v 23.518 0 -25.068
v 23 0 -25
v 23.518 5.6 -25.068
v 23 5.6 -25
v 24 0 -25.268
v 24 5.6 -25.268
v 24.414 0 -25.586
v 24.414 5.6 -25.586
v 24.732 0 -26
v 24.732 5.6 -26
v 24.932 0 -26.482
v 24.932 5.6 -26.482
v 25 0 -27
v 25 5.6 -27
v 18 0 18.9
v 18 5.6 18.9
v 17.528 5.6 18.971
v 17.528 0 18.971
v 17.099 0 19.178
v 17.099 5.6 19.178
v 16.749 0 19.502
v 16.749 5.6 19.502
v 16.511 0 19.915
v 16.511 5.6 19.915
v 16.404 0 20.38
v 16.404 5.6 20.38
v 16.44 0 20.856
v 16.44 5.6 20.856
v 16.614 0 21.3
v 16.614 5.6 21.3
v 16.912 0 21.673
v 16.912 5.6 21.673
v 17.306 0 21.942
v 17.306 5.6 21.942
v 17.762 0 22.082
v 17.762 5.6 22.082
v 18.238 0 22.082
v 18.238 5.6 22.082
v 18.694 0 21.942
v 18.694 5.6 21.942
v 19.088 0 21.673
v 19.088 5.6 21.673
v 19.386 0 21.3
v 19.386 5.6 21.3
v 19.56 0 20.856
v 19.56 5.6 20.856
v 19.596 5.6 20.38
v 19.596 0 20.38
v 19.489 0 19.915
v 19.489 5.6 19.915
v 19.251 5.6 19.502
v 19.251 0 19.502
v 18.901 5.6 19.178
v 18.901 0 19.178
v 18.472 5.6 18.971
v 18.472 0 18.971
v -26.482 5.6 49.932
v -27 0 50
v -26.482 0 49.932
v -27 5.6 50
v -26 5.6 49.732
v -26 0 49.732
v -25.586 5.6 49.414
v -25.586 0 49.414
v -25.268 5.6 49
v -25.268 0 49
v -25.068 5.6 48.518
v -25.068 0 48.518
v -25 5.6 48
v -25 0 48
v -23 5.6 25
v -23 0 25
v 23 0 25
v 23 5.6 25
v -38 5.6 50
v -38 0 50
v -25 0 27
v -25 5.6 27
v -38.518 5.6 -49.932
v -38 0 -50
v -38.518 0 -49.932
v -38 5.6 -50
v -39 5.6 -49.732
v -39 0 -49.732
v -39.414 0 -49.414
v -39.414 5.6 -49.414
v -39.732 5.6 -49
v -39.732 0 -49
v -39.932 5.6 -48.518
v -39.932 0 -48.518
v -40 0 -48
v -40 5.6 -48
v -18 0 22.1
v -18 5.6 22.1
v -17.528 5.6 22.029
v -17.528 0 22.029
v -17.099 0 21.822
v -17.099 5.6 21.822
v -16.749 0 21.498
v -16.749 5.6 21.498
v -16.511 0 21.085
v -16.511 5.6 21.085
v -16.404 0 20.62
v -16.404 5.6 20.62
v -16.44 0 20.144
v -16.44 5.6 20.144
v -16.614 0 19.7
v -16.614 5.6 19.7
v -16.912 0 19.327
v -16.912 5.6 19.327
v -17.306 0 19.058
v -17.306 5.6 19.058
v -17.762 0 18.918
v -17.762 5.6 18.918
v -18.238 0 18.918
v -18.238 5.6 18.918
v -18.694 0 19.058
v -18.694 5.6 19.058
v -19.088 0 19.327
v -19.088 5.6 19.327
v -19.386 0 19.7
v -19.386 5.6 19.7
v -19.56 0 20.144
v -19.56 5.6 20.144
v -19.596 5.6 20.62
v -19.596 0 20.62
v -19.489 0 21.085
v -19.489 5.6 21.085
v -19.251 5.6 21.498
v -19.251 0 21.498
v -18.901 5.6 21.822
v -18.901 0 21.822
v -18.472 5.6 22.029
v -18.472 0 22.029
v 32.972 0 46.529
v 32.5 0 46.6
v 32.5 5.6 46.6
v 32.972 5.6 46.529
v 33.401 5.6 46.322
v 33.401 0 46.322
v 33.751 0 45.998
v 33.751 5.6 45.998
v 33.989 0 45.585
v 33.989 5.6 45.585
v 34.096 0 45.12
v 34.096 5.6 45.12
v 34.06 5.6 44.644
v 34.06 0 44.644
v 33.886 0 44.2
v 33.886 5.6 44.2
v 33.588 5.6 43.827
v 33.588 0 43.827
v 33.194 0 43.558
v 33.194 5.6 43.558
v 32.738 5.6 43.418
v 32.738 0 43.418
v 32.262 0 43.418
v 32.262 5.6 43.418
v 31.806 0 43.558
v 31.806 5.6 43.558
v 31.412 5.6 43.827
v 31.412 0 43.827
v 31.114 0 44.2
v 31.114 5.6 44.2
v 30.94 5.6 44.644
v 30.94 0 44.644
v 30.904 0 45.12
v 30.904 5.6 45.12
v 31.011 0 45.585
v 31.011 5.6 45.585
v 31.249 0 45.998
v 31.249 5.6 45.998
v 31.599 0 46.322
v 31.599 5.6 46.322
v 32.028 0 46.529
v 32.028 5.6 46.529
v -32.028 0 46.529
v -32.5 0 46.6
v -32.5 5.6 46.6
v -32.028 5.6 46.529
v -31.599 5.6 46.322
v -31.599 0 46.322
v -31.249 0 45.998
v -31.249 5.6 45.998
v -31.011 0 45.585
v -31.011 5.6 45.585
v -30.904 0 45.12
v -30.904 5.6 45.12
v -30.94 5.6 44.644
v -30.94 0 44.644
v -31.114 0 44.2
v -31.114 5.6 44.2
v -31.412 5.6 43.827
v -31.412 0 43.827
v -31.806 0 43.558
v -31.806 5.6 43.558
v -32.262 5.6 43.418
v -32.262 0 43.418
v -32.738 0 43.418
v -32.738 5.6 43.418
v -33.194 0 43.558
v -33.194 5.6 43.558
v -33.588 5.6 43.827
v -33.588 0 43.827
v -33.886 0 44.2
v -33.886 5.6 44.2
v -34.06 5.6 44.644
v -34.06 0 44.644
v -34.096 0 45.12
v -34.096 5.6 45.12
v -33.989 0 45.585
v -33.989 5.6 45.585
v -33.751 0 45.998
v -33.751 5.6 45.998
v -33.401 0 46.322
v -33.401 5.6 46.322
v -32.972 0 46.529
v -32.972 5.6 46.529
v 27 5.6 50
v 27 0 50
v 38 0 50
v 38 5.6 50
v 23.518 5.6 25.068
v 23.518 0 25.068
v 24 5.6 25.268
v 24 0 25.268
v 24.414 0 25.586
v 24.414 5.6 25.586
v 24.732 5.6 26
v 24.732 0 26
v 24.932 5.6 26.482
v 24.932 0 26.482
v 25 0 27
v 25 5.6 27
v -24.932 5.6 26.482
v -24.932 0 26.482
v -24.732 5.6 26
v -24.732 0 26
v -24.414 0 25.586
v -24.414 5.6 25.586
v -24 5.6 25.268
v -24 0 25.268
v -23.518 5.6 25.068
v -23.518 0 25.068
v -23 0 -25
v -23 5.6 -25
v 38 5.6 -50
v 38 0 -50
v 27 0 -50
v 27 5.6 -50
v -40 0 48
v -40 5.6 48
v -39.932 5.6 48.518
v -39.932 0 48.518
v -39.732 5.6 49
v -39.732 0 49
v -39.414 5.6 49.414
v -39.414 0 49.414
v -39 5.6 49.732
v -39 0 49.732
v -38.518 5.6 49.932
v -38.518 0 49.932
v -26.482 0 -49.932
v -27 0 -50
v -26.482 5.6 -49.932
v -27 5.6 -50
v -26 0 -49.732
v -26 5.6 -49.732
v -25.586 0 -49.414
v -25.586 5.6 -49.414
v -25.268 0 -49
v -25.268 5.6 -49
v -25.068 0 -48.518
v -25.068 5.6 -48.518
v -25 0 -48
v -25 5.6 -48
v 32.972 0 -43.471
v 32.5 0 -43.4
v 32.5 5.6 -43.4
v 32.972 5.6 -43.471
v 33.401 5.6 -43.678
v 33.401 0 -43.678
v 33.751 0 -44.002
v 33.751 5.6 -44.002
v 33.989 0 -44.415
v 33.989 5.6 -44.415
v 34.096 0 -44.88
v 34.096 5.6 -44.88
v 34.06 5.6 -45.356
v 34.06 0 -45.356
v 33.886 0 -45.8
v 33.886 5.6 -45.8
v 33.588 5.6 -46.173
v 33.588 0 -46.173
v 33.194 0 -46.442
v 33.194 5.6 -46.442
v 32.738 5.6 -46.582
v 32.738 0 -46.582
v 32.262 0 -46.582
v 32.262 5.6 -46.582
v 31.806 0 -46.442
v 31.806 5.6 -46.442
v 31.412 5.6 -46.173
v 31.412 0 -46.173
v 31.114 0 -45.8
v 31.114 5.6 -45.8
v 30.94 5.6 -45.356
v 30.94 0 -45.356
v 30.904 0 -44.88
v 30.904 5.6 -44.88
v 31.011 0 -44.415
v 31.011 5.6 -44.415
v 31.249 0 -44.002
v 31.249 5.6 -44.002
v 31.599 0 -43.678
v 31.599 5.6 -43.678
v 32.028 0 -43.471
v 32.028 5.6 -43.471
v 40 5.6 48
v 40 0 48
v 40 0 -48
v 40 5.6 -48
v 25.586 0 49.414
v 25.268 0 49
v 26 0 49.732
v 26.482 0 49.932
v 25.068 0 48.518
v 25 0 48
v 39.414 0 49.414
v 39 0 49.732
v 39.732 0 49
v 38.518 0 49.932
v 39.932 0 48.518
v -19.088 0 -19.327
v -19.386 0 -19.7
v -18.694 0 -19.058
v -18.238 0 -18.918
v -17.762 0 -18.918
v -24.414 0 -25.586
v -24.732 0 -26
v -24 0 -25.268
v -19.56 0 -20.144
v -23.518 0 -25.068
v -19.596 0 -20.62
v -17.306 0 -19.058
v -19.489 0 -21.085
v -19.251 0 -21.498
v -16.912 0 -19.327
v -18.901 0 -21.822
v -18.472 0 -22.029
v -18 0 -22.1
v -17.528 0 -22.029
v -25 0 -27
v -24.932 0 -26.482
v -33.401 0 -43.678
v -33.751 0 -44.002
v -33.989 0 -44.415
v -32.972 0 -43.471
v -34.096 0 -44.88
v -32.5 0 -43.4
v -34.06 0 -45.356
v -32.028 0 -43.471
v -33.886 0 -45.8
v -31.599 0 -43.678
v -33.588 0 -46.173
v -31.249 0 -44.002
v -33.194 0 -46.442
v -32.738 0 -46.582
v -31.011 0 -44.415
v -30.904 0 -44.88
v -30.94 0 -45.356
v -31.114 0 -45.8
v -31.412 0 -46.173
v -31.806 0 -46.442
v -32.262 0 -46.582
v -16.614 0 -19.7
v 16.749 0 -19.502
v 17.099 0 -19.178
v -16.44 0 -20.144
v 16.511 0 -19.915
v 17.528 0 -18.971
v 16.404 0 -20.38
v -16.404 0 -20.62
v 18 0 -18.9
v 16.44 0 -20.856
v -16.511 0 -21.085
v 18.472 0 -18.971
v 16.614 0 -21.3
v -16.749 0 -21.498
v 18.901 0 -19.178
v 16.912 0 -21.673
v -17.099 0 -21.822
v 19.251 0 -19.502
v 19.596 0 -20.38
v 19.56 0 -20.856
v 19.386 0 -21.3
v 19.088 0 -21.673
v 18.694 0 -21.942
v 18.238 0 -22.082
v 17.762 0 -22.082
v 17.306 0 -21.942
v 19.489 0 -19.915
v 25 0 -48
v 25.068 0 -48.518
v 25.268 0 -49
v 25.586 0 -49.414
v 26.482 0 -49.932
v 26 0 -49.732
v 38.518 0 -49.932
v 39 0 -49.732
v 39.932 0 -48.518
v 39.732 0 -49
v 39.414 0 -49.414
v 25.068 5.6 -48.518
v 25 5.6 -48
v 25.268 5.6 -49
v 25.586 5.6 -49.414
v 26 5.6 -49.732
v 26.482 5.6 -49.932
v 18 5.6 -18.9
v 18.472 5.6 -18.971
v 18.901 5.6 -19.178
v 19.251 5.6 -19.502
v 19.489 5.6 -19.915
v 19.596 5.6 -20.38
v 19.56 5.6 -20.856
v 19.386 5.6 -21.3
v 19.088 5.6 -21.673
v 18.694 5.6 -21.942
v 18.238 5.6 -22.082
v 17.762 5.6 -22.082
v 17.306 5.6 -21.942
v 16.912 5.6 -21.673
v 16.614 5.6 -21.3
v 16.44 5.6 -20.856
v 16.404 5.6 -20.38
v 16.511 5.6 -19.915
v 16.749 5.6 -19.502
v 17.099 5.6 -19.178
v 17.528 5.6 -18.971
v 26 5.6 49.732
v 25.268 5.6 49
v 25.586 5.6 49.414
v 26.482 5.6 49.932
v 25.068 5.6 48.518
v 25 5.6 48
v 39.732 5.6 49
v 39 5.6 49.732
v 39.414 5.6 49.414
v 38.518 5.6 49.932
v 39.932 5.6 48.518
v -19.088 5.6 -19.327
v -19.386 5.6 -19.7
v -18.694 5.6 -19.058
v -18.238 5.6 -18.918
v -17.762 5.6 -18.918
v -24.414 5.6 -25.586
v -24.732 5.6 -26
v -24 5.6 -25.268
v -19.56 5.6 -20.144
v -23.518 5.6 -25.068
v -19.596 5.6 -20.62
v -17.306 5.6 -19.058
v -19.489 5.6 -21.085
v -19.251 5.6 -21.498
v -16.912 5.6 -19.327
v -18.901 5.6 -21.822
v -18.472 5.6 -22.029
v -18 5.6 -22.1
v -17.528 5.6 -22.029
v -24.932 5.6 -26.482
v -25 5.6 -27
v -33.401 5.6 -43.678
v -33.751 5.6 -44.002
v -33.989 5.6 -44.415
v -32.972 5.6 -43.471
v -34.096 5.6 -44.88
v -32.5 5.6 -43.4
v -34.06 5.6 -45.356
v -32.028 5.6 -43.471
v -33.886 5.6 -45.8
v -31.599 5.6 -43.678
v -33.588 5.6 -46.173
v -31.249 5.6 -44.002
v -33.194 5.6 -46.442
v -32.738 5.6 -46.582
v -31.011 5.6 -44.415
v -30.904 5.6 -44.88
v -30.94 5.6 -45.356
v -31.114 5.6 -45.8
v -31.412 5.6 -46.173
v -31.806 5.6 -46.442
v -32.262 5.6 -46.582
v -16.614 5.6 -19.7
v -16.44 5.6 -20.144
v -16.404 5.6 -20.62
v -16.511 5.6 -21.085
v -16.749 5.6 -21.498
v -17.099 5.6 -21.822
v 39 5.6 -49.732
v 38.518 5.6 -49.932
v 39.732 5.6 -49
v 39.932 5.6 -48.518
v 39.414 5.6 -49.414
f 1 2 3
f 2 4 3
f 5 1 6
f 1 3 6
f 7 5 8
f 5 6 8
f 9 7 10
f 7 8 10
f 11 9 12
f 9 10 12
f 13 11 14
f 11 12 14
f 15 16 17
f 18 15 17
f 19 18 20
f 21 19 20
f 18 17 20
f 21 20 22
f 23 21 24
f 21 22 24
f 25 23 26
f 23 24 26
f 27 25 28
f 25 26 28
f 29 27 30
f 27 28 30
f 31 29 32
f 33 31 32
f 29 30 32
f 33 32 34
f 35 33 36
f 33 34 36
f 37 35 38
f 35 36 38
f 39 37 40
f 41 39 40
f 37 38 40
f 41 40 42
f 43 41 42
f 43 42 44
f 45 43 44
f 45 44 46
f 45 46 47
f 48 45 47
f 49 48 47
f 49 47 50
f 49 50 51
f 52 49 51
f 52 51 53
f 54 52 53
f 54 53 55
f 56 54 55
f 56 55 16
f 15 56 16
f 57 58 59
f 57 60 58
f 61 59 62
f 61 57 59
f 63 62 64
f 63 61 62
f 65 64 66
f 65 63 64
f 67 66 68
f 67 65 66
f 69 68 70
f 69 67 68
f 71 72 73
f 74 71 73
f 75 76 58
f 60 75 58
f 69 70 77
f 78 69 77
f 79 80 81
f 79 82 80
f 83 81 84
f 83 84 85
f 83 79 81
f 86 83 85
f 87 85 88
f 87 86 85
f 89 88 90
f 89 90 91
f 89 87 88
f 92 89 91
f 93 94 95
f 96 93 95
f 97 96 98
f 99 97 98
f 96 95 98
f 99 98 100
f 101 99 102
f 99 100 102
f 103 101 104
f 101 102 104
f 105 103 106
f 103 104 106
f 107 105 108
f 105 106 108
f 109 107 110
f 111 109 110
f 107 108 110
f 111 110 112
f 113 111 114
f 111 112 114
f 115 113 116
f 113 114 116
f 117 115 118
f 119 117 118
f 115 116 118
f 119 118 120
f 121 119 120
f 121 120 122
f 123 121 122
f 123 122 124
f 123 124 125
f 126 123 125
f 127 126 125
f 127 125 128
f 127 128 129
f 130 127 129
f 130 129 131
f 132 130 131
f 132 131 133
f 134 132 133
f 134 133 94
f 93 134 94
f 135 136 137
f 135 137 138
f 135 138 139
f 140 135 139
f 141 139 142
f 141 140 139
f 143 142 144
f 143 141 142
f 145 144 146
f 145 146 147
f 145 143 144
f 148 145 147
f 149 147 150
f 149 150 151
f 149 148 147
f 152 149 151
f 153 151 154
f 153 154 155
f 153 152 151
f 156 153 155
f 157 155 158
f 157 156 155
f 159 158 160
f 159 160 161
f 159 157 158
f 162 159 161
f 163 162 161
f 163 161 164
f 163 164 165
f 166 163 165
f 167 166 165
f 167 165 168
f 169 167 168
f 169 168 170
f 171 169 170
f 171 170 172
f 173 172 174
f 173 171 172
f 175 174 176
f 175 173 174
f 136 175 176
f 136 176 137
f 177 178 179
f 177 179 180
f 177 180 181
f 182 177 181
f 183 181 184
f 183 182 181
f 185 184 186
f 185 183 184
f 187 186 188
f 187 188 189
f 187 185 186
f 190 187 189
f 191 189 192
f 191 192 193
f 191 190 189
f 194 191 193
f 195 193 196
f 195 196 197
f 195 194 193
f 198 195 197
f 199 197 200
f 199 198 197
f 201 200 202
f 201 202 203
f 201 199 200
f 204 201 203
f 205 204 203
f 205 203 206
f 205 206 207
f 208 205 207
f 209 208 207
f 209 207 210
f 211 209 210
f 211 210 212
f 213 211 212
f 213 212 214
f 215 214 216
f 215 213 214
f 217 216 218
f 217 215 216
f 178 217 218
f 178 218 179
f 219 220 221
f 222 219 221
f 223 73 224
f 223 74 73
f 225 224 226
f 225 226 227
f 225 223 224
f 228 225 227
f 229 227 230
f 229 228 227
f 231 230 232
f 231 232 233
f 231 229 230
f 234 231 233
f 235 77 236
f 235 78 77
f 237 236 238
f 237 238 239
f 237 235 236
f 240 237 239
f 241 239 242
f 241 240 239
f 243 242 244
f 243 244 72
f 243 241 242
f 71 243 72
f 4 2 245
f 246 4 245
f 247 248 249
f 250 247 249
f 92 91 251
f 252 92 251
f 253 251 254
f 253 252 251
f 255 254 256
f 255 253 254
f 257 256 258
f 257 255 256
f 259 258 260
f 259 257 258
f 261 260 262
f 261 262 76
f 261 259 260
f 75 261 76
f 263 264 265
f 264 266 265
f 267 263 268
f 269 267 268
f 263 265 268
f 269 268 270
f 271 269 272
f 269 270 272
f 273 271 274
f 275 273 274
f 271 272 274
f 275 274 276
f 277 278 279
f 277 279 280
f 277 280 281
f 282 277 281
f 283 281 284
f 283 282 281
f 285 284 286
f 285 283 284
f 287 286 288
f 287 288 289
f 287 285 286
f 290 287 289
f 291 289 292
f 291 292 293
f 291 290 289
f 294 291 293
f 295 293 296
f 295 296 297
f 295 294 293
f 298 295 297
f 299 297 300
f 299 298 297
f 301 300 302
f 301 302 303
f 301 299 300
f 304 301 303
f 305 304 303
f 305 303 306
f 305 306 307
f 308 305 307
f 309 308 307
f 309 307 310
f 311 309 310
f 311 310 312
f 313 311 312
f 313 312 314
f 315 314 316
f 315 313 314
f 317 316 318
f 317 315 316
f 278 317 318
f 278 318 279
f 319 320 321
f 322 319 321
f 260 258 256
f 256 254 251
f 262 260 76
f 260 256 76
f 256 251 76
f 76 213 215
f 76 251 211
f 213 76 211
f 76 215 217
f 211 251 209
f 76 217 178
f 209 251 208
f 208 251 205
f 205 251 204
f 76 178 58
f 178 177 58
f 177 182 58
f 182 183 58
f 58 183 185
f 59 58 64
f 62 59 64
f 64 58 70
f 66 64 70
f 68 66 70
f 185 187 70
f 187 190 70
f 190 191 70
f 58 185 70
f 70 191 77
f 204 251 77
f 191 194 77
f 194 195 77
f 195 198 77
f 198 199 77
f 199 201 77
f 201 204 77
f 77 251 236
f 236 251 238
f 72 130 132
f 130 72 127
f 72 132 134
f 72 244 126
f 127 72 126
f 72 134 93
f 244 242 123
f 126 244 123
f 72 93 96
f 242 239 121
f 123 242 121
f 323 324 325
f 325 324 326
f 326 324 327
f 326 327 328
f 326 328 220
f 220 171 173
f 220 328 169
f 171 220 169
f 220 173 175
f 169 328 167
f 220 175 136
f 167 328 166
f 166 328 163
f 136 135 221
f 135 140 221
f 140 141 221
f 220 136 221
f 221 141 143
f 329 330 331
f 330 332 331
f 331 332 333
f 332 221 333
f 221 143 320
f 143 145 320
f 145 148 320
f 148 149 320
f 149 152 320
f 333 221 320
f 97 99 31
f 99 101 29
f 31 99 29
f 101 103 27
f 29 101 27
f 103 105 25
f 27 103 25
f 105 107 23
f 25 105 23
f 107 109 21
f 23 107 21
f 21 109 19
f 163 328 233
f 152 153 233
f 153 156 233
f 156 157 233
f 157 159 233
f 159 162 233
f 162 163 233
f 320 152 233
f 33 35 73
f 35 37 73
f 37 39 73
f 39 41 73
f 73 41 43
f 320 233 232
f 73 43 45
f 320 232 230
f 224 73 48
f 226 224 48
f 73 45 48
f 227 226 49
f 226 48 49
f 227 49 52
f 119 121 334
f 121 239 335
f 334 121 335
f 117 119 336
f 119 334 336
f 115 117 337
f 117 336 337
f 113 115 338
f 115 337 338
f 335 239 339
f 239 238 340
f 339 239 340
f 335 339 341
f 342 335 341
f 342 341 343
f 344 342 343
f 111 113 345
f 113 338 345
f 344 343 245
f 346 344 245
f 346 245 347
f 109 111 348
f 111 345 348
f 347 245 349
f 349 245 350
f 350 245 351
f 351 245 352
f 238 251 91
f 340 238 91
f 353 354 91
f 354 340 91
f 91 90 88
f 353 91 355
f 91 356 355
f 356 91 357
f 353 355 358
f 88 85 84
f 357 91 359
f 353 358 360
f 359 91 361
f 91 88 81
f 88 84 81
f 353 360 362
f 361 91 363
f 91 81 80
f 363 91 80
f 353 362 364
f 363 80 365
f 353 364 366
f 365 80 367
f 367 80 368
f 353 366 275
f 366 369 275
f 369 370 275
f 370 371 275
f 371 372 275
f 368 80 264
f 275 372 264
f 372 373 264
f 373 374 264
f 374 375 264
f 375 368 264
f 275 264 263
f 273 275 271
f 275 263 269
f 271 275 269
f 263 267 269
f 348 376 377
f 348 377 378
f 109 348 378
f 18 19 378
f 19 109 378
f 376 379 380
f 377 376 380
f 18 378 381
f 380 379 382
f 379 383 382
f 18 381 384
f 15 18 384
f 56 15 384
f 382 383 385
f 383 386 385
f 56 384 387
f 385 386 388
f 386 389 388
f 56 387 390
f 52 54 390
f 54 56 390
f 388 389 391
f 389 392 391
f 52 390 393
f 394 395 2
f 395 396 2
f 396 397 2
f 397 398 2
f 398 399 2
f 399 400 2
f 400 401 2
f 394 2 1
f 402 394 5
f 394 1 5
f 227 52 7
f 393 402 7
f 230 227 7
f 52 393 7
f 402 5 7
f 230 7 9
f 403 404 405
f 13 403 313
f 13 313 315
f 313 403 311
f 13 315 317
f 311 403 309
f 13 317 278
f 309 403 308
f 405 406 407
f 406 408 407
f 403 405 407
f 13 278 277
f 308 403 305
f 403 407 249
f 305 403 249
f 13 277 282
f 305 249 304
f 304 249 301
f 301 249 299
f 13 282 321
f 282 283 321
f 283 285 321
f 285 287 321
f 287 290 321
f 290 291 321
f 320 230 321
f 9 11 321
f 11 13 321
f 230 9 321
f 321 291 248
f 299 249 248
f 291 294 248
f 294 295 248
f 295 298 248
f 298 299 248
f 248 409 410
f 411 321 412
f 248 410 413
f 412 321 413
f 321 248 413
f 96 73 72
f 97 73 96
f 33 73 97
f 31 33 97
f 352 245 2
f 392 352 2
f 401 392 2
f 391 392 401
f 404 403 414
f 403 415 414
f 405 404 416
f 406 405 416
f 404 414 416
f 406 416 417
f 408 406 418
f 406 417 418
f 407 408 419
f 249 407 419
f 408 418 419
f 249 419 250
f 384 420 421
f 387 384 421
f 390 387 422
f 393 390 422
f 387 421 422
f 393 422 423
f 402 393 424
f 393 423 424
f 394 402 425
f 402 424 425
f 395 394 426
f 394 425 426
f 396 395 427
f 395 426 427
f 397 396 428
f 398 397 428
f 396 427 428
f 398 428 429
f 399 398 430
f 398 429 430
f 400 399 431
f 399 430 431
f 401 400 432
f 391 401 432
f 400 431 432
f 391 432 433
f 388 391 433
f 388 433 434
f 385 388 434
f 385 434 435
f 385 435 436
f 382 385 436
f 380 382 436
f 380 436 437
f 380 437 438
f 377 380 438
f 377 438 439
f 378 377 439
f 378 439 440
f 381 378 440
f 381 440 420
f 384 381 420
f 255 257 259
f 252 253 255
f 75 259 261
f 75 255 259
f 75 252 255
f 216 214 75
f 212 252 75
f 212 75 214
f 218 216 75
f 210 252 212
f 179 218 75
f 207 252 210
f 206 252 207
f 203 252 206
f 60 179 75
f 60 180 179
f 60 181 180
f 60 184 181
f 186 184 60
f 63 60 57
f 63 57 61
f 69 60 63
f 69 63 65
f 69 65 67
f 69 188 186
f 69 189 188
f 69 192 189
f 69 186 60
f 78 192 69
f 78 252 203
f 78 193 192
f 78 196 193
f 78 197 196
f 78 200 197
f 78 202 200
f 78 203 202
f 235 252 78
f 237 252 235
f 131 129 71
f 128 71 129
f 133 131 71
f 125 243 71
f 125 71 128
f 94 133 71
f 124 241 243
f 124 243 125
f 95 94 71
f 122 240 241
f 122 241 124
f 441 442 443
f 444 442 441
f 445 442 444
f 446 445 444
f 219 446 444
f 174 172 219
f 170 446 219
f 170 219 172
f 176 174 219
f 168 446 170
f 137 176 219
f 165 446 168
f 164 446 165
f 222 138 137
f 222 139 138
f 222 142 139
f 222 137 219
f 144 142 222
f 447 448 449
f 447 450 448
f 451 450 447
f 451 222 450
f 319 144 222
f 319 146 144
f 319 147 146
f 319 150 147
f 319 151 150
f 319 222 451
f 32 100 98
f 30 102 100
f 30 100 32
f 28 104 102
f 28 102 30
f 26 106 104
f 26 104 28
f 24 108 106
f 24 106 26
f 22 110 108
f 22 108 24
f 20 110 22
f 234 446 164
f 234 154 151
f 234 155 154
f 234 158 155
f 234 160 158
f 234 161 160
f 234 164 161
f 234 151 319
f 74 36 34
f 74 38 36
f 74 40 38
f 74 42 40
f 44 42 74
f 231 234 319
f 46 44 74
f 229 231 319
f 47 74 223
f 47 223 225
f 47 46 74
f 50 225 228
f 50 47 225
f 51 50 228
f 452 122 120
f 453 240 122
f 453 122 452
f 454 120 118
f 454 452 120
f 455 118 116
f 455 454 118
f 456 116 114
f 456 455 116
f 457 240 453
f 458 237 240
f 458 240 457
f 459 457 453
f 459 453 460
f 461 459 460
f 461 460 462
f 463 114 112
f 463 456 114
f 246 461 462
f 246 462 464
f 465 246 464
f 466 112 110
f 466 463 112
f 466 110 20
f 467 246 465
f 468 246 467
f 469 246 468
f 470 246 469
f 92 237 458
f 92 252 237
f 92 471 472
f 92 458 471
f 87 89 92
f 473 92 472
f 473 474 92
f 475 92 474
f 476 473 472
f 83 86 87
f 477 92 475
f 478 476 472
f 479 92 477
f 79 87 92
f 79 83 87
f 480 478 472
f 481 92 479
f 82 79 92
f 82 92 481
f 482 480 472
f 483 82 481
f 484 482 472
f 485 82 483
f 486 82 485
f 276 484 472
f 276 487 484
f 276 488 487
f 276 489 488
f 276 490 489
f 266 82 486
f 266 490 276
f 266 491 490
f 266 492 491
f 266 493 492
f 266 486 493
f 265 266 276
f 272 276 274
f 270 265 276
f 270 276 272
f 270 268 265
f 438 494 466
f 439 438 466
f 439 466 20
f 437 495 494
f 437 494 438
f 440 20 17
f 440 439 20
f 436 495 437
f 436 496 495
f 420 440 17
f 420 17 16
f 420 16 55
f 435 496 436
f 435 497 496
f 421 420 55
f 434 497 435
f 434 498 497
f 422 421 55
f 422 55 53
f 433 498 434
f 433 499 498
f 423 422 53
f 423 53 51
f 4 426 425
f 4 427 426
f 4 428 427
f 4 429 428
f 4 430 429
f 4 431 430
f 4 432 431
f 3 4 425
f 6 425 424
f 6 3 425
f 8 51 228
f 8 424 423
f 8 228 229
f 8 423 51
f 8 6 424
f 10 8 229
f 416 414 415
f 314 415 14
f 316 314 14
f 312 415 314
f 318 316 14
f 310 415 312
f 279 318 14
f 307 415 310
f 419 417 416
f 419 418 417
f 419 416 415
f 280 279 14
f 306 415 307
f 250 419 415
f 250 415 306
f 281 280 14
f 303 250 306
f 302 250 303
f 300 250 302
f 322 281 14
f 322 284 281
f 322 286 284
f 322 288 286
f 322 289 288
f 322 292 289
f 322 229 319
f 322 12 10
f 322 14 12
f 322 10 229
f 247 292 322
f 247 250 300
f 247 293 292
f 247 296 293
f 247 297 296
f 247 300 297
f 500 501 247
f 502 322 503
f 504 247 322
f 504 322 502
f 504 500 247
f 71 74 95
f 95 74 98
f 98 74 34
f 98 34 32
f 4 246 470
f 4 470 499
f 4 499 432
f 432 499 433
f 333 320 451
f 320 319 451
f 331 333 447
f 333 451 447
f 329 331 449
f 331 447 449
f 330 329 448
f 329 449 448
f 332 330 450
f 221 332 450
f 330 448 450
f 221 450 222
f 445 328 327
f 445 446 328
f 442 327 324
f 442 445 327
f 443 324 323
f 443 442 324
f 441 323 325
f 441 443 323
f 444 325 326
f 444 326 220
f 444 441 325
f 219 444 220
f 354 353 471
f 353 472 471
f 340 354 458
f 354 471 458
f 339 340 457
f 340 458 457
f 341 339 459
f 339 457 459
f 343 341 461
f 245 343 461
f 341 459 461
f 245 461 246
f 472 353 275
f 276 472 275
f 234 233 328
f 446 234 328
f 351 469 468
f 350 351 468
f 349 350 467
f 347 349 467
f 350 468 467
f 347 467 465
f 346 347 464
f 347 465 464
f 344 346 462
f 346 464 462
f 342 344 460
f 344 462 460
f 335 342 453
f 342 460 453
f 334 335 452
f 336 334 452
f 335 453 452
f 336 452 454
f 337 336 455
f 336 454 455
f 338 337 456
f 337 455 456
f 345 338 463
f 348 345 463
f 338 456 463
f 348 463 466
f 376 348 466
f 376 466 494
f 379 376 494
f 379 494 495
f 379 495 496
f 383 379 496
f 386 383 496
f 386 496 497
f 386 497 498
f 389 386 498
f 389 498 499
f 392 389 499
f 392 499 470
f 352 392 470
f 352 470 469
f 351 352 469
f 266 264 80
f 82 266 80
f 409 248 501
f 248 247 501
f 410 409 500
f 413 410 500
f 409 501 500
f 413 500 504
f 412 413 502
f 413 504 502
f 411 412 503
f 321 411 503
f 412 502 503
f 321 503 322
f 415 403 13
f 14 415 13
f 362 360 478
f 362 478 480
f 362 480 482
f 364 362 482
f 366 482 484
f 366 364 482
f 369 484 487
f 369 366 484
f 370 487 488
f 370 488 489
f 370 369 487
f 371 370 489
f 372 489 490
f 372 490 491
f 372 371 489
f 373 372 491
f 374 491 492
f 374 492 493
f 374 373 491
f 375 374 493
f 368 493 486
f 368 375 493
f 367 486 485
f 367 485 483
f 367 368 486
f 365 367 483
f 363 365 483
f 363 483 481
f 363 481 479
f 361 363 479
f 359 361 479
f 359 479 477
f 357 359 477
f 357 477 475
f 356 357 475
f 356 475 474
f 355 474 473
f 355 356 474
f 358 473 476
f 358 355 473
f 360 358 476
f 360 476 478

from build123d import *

# Parameters (mm, degrees)
SKETCH_1_R          = 1.6
EXTRUDE_1_DEPTH     = 5.6
SKETCH_2_R          = 1.6
CUT_EXTRUDE_1_DEPTH = 65.275656356
FILLET_1_R          = 2


with BuildPart() as part:
    # ｽｹｯﾁ1 → ﾎﾞｽ - 押し出し1 (new body)
    with BuildSketch(Plane(origin=(0, 0, 0), x_dir=(1, 0, 0), z_dir=(0, 1, 0))):
        Polygon((-25, 50), (-40, 50), (-40, -50), (-25, -50), (-25, -25), (25, -25), (25, -50), (40, -50), (40, 50), (25, 50), (25, 25), (-25, 25), align=None)
        with Locations(Location((-32.5, -45, 0), (0, 0, 270))):
            Circle(SKETCH_1_R, mode=Mode.SUBTRACT)
        with Locations(Location((32.5, -45, 0), (0, 0, 270))):
            Circle(SKETCH_1_R, mode=Mode.SUBTRACT)
        with Locations(Location((-32.5, 45, 0), (0, 0, 270))):
            Circle(SKETCH_1_R, mode=Mode.SUBTRACT)
        with Locations(Location((32.5, 45, 0), (0, 0, 270))):
            Circle(SKETCH_1_R, mode=Mode.SUBTRACT)
    extrude(amount=EXTRUDE_1_DEPTH)

    # ｽｹｯﾁ2 → ｶｯﾄ - 押し出し1 (cut, through all)
    with BuildSketch(Plane(origin=(0, 5.6, 0), x_dir=(1, 0, 0), z_dir=(0, 1, 0))):
        with Locations(Location((18, 20.5, 0), (0, 0, 270))):
            Circle(SKETCH_2_R)
        with Locations(Location((18, -20.5, 0), (0, 0, 90))):
            Circle(SKETCH_2_R)
        with Locations(Location((-18, -20.5, 0), (0, 0, 270))):
            Circle(SKETCH_2_R)
        with Locations(Location((-18, 20.5, 0), (0, 0, 90))):
            Circle(SKETCH_2_R)
    extrude(amount=-CUT_EXTRUDE_1_DEPTH, mode=Mode.SUBTRACT)

    # ﾌｨﾚｯﾄ1
    fillet_1_edges = [part.edges().sort_by_distance(p)[0] for p in [
        (-25, 2.8, 50),
        (-40, 2.8, 50),
        (-40, 2.8, -50),
        (-25, 2.8, -50),
        (-25, 2.8, -25),
        (25, 2.8, -25),
        (25, 2.8, -50),
        (40, 2.8, -50),
        (40, 2.8, 50),
        (25, 2.8, 50),
        (25, 2.8, 25),
        (-25, 2.8, 25),
    ]]
    fillet(fillet_1_edges, radius=FILLET_1_R)


solid = part.part
